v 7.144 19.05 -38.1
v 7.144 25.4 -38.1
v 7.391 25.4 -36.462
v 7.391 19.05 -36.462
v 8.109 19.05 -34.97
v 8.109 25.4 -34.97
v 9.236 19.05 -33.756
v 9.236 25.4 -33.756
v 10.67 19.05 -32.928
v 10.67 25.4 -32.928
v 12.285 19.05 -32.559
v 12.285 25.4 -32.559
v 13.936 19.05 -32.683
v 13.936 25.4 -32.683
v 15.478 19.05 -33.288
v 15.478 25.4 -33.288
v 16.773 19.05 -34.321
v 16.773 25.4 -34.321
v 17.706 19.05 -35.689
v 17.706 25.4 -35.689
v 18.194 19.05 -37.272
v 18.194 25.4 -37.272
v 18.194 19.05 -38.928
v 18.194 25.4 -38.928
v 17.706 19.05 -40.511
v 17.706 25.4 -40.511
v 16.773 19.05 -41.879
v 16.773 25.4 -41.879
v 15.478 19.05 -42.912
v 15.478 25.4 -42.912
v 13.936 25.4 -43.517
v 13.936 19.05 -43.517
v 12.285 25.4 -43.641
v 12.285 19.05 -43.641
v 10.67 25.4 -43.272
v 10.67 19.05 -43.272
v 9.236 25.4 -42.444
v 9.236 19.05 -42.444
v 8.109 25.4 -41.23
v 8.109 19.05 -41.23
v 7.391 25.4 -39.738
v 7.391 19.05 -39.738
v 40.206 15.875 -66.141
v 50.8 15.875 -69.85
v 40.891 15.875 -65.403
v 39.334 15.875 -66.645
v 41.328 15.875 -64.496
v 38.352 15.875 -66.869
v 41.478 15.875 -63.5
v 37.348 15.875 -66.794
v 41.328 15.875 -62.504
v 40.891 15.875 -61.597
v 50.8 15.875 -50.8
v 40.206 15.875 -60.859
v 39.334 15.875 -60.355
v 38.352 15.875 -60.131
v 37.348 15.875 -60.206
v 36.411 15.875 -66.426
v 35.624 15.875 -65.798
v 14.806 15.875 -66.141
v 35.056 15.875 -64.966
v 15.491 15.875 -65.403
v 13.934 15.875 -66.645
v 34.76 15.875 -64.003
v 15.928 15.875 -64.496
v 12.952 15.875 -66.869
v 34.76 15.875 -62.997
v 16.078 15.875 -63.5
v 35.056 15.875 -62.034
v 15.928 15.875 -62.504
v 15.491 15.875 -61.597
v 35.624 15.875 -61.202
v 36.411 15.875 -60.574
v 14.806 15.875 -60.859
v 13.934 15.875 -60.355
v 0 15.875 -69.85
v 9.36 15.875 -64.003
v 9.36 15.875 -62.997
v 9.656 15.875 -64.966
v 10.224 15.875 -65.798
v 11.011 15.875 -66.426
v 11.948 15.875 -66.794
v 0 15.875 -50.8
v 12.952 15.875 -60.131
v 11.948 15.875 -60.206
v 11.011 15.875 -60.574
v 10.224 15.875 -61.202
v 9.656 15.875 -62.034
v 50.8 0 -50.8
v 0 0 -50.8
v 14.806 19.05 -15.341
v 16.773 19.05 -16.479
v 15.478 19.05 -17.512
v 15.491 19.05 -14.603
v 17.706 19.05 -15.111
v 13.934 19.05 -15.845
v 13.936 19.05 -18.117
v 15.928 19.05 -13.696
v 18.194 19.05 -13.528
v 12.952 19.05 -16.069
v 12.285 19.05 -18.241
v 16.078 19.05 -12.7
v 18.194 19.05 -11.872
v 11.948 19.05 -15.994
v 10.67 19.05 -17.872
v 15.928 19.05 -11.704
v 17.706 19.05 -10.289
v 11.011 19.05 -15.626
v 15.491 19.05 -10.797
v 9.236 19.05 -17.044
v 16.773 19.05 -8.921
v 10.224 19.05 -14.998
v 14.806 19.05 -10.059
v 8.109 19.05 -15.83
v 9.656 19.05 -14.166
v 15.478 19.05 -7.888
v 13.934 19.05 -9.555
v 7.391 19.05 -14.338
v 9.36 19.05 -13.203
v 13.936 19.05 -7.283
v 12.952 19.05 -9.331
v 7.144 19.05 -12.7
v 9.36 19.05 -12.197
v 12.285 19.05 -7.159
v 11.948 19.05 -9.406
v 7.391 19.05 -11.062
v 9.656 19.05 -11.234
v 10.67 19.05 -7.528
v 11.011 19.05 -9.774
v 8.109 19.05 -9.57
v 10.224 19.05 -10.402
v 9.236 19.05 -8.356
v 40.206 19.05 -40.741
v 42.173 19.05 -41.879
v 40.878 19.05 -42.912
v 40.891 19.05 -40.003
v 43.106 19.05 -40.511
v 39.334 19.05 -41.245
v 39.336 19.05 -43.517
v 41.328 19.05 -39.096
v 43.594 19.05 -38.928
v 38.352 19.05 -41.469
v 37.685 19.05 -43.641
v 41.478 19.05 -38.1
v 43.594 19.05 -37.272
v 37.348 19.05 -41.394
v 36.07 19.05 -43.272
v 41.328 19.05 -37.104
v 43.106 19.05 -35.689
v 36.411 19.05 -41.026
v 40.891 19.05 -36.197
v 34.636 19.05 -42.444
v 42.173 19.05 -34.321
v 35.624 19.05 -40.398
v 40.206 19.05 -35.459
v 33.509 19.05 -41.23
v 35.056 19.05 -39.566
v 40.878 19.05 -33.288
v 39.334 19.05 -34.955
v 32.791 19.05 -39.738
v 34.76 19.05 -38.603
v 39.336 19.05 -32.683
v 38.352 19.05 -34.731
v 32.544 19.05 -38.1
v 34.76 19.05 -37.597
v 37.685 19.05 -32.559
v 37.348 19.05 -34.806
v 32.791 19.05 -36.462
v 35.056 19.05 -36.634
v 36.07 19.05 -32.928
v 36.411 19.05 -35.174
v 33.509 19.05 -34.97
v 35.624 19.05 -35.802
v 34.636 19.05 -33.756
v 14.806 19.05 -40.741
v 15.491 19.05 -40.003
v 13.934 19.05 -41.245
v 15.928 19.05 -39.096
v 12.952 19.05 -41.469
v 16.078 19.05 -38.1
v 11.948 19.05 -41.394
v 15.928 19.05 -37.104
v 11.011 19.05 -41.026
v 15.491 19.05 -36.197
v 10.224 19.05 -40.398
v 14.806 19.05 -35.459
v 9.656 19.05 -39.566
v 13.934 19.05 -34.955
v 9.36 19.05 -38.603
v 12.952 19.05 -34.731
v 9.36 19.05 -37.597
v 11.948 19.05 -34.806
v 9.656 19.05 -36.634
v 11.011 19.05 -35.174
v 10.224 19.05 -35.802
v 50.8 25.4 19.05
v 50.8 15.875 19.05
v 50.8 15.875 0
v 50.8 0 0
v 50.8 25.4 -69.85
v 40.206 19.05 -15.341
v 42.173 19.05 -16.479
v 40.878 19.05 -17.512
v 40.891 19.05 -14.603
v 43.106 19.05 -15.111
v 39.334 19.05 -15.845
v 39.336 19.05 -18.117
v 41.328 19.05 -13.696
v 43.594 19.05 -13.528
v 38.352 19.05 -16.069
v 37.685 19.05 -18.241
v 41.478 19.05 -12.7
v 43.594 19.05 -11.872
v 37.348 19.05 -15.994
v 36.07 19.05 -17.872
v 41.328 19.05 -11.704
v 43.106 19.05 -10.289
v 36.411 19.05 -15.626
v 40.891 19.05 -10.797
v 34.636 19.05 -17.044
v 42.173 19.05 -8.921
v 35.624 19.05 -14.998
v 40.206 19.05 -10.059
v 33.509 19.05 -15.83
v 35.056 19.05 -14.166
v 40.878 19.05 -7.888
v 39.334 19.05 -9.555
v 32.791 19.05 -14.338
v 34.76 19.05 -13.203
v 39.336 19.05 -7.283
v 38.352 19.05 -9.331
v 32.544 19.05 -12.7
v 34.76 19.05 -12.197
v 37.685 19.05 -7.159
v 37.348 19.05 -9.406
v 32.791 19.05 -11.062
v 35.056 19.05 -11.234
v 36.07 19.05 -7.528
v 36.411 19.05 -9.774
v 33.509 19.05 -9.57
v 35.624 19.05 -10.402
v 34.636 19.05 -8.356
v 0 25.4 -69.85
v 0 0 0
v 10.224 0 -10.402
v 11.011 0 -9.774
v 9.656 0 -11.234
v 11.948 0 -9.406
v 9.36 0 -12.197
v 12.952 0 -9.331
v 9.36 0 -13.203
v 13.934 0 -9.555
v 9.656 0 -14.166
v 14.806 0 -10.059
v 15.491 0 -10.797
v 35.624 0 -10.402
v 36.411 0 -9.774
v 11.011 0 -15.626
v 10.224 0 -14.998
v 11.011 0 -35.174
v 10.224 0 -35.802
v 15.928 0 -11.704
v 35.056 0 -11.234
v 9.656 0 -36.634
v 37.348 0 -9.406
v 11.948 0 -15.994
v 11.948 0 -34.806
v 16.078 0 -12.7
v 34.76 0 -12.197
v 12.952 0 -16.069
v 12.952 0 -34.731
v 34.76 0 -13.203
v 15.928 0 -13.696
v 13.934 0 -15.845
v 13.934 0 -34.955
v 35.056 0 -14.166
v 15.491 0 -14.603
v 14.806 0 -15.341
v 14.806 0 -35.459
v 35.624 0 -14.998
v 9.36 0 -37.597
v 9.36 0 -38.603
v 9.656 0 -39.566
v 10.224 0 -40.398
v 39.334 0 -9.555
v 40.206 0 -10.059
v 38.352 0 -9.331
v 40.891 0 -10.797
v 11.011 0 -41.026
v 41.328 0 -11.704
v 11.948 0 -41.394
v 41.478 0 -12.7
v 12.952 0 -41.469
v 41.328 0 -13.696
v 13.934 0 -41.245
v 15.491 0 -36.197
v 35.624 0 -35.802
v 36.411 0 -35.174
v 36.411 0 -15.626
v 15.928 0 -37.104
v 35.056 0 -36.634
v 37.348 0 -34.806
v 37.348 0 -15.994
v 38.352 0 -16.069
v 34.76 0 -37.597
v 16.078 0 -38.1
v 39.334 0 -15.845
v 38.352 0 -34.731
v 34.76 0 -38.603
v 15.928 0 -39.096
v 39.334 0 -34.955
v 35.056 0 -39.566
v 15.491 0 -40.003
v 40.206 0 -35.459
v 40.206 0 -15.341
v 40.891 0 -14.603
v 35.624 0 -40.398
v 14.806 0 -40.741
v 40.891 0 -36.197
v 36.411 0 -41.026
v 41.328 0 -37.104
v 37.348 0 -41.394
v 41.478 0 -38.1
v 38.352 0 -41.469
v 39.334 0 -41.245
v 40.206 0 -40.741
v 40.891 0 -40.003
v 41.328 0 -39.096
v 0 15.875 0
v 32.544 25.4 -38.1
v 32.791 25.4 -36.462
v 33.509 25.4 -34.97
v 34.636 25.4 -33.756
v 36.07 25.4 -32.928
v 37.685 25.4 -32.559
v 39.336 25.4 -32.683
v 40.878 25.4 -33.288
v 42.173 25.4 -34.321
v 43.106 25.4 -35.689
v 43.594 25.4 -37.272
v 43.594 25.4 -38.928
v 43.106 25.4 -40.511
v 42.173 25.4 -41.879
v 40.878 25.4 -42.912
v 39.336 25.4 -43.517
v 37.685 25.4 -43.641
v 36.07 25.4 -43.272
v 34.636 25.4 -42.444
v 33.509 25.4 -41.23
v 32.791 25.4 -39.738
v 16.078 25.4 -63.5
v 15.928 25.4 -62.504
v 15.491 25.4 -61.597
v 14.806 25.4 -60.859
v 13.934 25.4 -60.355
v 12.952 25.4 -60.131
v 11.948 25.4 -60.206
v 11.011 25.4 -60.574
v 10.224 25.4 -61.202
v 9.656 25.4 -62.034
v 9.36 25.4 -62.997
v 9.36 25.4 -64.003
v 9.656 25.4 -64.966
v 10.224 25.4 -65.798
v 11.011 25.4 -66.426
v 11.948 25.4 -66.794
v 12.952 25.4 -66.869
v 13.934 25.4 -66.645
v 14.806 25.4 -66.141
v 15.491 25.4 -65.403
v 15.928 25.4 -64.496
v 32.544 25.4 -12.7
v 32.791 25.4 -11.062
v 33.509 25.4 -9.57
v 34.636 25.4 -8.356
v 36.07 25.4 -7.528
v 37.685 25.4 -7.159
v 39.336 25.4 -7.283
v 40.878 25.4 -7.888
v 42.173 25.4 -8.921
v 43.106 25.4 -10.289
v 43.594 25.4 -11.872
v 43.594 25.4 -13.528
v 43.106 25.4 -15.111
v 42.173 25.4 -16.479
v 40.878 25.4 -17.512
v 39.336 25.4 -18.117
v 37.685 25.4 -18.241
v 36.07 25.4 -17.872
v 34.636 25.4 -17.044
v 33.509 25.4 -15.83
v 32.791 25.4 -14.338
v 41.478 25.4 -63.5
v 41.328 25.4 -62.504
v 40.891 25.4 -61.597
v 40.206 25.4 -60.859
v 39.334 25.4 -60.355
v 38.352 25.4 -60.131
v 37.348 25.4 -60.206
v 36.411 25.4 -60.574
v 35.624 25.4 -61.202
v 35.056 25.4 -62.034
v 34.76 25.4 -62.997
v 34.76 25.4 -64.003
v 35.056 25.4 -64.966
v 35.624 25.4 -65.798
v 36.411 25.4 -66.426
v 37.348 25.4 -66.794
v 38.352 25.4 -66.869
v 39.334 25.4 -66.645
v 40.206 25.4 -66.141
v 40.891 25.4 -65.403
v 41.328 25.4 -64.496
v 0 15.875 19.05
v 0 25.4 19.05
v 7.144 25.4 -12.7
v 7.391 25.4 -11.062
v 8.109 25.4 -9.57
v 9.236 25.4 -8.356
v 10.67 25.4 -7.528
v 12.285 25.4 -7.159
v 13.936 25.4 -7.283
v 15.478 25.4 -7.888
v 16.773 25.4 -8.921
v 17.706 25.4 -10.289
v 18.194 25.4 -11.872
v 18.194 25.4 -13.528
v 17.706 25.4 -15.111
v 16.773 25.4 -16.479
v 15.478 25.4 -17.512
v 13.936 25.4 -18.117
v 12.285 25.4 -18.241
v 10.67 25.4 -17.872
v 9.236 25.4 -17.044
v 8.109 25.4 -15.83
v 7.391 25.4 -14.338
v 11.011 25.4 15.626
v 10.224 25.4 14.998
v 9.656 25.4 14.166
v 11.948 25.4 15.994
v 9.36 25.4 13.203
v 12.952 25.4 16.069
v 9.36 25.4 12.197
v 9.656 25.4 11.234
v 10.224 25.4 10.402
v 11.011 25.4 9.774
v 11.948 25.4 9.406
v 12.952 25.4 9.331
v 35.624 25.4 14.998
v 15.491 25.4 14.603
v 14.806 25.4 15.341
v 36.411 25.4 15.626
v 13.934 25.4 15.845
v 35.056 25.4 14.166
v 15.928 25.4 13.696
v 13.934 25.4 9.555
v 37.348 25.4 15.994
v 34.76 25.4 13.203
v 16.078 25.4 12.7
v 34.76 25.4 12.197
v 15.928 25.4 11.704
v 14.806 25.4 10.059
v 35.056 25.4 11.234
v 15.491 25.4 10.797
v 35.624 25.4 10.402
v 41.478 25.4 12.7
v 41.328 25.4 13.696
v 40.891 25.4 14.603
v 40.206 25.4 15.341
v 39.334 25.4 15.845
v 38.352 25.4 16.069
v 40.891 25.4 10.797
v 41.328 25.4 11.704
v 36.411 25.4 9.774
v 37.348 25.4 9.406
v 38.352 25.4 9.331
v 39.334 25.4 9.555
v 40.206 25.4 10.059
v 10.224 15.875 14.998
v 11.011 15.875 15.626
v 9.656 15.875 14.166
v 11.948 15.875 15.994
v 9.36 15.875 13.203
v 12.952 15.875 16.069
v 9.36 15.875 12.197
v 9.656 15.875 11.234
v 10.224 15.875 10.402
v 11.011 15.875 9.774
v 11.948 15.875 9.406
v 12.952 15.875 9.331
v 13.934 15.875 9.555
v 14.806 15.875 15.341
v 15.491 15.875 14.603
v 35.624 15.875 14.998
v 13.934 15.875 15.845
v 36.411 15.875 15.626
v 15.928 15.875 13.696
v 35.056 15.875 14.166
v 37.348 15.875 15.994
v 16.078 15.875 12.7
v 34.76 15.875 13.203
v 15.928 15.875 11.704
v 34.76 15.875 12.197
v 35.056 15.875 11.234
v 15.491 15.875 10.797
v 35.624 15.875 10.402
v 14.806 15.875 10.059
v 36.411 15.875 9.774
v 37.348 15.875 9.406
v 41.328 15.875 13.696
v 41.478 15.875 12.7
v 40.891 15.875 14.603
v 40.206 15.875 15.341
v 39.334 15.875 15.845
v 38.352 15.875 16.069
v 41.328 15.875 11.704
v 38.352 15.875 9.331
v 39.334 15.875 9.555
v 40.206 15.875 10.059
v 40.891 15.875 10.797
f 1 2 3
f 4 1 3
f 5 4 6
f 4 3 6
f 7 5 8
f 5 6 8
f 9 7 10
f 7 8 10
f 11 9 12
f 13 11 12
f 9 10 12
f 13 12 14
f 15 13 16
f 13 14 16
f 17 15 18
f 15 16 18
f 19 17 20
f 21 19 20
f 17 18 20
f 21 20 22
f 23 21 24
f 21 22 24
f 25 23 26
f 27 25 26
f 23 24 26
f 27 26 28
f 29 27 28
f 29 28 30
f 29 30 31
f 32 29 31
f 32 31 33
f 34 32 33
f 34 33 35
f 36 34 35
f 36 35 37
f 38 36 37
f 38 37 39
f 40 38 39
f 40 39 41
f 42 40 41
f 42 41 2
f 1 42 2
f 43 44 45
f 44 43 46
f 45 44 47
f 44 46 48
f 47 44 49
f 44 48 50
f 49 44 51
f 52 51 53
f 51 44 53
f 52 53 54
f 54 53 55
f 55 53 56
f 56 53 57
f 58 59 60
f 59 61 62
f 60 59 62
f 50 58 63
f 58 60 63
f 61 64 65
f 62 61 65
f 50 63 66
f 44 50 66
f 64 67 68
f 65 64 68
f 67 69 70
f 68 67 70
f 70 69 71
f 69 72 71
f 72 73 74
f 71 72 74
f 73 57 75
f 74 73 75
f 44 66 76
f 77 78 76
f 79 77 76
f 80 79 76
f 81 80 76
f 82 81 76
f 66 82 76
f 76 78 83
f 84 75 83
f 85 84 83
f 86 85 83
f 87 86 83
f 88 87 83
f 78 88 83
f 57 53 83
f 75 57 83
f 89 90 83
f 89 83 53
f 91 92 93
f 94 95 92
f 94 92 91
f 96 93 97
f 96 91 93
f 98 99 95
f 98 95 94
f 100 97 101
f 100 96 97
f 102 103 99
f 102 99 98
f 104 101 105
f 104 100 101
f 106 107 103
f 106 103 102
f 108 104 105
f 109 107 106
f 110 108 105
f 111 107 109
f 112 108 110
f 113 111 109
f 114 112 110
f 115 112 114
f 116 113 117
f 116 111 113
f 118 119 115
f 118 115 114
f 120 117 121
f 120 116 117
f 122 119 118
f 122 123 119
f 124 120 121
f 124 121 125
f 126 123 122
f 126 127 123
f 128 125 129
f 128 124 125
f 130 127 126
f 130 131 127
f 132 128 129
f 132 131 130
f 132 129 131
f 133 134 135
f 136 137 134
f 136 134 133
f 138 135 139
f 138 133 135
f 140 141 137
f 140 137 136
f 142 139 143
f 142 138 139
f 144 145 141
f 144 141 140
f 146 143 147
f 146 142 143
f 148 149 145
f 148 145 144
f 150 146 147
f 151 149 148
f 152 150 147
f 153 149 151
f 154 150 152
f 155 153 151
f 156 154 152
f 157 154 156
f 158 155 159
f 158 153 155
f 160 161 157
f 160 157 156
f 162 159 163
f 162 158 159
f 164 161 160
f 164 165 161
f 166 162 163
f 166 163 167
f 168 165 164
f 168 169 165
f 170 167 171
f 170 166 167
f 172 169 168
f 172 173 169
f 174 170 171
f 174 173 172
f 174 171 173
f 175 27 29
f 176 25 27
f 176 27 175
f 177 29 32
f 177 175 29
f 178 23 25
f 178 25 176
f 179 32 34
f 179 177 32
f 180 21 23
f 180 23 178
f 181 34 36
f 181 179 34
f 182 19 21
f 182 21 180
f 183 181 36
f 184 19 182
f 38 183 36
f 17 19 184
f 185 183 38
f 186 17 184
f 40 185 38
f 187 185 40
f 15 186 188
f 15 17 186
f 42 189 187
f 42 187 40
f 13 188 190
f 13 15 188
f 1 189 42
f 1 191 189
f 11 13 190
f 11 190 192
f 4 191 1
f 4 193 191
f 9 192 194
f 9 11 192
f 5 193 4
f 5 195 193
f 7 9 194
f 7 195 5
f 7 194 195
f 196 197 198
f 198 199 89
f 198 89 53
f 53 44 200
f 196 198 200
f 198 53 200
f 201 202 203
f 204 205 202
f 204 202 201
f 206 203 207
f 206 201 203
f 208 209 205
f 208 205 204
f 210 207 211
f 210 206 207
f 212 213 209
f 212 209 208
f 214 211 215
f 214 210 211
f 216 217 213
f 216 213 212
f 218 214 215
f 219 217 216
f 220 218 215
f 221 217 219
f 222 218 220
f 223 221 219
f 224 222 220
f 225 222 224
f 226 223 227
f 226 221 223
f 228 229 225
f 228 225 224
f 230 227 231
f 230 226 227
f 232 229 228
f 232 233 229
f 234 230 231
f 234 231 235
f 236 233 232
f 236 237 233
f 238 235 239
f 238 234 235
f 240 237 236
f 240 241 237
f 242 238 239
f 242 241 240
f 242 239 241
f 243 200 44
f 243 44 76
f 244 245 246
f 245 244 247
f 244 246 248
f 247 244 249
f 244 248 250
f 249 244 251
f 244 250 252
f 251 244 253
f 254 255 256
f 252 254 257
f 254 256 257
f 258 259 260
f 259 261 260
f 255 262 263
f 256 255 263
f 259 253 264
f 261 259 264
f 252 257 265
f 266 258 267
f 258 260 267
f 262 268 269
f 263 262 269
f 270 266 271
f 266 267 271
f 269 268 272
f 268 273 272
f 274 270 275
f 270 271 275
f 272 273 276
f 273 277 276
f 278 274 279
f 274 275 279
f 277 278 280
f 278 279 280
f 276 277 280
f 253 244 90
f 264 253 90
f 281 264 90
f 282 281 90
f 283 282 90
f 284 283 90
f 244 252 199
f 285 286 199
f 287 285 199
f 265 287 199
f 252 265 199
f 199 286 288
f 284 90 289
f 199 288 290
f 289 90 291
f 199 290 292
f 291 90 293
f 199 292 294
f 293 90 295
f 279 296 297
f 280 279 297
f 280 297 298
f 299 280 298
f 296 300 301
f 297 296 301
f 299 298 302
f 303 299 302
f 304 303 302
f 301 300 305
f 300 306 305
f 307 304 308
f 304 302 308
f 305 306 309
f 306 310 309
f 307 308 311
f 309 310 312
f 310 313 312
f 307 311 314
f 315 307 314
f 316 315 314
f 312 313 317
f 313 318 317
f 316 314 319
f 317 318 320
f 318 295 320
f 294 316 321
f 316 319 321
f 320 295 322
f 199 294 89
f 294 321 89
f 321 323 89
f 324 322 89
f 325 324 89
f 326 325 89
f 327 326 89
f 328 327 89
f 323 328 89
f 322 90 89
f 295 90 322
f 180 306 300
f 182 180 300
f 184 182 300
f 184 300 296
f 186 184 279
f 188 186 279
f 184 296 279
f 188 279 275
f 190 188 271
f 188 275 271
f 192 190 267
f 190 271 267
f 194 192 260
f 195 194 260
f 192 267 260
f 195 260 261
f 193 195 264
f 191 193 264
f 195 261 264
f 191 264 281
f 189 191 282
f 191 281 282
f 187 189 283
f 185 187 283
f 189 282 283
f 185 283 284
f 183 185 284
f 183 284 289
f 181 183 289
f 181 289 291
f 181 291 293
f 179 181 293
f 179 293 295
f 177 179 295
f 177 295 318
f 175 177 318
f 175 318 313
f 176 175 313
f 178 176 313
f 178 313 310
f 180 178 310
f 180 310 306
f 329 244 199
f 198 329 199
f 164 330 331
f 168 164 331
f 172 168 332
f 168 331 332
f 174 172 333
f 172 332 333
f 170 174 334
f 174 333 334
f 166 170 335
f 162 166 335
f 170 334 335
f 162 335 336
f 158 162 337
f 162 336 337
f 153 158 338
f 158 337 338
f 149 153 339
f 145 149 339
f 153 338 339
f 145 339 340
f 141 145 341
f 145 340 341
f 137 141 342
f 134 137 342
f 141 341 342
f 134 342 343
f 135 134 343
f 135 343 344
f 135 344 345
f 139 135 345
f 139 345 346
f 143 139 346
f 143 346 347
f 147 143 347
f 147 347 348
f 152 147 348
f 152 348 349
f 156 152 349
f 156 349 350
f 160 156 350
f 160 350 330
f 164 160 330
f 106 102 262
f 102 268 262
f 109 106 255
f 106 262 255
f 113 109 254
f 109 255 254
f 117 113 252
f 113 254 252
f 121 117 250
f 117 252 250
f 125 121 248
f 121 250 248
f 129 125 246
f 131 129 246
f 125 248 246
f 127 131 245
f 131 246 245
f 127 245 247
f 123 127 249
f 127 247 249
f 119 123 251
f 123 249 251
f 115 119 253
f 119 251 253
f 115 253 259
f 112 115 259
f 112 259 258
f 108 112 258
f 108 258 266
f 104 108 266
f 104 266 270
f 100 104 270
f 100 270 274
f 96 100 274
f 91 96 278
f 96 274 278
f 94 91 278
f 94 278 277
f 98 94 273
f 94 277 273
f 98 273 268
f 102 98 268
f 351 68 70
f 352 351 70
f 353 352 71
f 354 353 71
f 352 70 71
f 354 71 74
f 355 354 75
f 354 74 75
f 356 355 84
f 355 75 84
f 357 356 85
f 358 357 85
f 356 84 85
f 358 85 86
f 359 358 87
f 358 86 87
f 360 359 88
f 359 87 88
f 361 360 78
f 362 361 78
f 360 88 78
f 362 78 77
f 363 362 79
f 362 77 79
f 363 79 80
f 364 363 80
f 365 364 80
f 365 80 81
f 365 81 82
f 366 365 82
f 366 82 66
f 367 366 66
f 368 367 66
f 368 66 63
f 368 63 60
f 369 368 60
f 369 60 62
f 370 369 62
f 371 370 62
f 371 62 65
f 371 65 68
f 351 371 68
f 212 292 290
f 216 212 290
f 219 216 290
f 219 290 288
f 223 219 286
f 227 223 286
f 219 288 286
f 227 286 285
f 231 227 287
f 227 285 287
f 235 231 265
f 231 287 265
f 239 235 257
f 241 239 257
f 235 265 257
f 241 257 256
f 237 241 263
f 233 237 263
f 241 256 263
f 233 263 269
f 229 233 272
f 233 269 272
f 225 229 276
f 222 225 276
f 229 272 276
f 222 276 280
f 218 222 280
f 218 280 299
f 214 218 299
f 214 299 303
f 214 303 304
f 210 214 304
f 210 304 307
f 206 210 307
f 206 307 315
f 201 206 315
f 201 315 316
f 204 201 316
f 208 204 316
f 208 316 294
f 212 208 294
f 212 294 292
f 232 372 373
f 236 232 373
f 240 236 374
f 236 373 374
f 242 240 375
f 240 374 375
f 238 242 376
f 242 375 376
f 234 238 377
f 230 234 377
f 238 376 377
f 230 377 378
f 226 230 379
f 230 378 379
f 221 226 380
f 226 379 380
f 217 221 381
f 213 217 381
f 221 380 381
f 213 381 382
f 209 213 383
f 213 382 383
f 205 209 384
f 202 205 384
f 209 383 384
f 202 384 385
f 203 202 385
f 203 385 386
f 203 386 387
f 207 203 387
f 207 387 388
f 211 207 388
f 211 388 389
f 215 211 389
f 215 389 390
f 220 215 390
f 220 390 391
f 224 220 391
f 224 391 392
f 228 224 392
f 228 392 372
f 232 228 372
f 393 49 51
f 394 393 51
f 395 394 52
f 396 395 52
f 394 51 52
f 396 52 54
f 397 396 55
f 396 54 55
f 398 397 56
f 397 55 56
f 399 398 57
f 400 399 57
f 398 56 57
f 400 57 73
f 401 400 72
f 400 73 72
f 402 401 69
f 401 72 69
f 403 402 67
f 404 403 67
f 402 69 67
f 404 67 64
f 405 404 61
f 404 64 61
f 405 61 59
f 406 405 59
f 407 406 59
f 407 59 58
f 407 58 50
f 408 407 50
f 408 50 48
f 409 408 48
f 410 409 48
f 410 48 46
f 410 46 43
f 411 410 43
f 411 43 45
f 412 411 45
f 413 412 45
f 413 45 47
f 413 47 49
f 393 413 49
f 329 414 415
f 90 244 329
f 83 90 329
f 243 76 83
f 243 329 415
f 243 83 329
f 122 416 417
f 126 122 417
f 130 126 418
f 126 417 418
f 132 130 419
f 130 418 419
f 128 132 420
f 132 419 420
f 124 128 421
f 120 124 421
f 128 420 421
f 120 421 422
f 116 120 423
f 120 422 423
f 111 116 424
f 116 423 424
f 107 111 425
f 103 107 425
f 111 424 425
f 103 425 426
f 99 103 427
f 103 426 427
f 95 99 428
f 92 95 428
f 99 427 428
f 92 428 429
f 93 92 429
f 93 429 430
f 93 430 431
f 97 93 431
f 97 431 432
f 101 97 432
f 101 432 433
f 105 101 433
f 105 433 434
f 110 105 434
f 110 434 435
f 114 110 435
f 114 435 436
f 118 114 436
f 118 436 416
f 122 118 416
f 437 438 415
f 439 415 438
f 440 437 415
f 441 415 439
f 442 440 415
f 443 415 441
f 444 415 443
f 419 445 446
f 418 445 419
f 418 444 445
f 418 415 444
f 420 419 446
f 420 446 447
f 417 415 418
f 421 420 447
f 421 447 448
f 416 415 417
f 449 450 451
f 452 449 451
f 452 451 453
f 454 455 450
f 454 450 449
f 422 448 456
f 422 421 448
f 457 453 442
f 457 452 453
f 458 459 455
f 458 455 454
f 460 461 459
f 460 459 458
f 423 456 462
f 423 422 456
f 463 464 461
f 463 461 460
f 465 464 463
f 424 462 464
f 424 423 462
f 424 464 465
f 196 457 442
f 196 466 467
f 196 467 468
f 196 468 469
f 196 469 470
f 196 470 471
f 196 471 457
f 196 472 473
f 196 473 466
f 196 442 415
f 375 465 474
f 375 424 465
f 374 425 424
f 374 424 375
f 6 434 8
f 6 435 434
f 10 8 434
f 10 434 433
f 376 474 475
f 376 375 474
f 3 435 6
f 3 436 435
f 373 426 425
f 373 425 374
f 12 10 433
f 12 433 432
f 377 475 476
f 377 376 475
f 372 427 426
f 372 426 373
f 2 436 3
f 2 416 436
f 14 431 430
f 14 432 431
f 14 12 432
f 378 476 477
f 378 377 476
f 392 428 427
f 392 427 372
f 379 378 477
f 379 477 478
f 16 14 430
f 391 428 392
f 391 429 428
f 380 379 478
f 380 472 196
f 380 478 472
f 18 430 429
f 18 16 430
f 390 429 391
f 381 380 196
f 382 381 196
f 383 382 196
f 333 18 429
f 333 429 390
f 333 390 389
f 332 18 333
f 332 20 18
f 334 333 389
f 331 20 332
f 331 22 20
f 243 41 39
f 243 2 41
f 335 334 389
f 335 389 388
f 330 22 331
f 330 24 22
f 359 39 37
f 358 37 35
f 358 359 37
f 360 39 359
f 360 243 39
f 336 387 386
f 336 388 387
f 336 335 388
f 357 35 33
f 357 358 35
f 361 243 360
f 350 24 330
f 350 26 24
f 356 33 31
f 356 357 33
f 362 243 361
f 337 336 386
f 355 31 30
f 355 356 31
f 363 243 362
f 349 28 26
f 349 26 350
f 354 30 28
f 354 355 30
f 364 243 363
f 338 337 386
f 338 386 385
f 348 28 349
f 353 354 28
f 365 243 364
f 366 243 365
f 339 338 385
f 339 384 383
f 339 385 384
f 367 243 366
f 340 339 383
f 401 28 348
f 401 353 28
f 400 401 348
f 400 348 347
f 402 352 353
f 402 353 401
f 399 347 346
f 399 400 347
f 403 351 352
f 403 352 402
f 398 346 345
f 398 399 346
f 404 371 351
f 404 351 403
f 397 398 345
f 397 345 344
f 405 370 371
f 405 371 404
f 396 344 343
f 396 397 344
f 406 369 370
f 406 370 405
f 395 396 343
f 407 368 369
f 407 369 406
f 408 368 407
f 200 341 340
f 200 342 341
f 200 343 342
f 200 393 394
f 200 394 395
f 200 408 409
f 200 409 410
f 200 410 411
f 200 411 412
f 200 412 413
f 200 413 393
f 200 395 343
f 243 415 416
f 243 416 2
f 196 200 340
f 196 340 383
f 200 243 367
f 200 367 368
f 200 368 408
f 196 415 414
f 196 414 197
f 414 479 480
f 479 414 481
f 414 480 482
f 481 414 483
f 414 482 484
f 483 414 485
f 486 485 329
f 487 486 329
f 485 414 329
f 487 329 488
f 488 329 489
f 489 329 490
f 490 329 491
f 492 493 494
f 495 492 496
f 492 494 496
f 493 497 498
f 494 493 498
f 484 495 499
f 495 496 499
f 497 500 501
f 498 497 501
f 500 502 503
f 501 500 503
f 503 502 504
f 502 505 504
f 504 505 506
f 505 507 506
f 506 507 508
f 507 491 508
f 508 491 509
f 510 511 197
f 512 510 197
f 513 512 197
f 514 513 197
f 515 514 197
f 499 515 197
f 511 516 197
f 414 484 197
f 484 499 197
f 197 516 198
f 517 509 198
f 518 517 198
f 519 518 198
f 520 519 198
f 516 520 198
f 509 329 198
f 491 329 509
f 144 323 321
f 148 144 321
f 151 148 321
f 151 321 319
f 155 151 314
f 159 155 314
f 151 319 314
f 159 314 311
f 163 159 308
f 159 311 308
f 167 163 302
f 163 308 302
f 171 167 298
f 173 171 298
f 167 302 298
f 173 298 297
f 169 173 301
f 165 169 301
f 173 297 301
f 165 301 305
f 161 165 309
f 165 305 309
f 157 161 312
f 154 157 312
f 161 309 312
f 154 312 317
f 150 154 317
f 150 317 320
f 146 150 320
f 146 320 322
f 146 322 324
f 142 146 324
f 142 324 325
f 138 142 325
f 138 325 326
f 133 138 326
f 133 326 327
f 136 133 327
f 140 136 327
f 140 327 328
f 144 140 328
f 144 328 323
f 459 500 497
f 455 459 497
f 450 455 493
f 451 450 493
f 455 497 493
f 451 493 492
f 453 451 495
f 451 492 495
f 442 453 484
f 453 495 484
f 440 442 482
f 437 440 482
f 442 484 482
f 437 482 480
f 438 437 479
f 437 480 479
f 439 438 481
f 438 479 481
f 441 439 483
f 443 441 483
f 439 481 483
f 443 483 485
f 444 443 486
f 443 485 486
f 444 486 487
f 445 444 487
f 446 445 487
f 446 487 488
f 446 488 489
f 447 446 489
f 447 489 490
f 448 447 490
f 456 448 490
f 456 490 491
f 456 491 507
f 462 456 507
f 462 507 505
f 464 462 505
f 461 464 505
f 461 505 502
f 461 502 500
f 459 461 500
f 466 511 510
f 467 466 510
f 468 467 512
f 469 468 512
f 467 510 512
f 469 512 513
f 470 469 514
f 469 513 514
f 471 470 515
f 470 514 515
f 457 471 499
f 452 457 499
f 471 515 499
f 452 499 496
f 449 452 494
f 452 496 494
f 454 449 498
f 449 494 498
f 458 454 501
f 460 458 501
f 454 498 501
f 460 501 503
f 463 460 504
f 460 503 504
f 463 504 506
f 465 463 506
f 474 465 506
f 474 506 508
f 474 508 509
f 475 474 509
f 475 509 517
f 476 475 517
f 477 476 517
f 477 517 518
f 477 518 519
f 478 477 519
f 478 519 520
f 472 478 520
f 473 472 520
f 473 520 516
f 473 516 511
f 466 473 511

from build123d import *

# Parameters (mm, degrees)
SKETCH1_W                                        = 50.8
SKETCH1_H                                        = 50.8
BOSS_EXTRUDE1_DEPTH                              = 25.4
SKETCH7_W                                        = 50.8
SKETCH7_H                                        = 9.525
BOSS_EXTRUDE2_DEPTH                              = 19.05
SKETCH11_W                                       = 50.8
SKETCH11_H                                       = 9.525
BOSS_EXTRUDE3_DEPTH                              = 19.05
F_1_4_CLEARANCE_HOLE1_D                          = 6.7564
CBORE_FOR_1_4_SOCKET_HEAD_CAP_SCREW1_D           = 6.7564
CBORE_FOR_1_4_SOCKET_HEAD_CAP_SCREW1_CBORE_D     = 11.1125
CBORE_FOR_1_4_SOCKET_HEAD_CAP_SCREW1_CBORE_DEPTH = 6.35
LPATTERN1_COUNT                                  = 4
LPATTERN1_PITCH                                  = 25.4
LPATTERN1_COUNT_DIR2                             = 2
LPATTERN1_PITCH_DIR2                             = 25.4
LPATTERN2_COUNT                                  = 2
LPATTERN2_PITCH                                  = 25.4
LPATTERN2_COUNT_DIR2                             = 2
LPATTERN2_PITCH_DIR2                             = 25.4


with BuildPart() as part:
    # Sketch1 → Boss-Extrude1 (new body)
    with BuildSketch(Plane(origin=(0, 0, 0), x_dir=(1, 0, 0), z_dir=(0, 1, 0))):
        with Locations((25.4, 25.4)):
            Rectangle(SKETCH1_W, SKETCH1_H)
    extrude(amount=BOSS_EXTRUDE1_DEPTH)

    # Sketch7 → Boss-Extrude2 (add)
    with BuildSketch(Plane(origin=(0, 0, -50.8), x_dir=(-1, 0, 0), z_dir=(0, 0, -1))):
        with Locations((-25.4, 20.6375)):
            Rectangle(SKETCH7_W, SKETCH7_H)
    extrude(amount=BOSS_EXTRUDE2_DEPTH)

    # Sketch11 → Boss-Extrude3 (add)
    with BuildSketch(Plane.XY):
        with Locations((25.4, 20.6375)):
            Rectangle(SKETCH11_W, SKETCH11_H)
    extrude(amount=BOSS_EXTRUDE3_DEPTH)

    # 1/4 Clearance Hole1 (through all)
    with Locations(Plane(origin=(0, 25.4, 0), x_dir=(-1, 0, 0), z_dir=(0, 1, 0))):
        with Locations((-12.7, -63.5)):
            f_1_4_clearance_hole1 = Hole(F_1_4_CLEARANCE_HOLE1_D / 2)

    # CBORE for 1/4 Socket Head Cap Screw1 (through all)
    with Locations(Plane(origin=(0, 25.4, 0), x_dir=(-1, 0, 0), z_dir=(0, 1, 0))):
        with Locations((-12.7, -12.7)):
            cbore_for_1_4_socket_head_cap_screw1 = CounterBoreHole(CBORE_FOR_1_4_SOCKET_HEAD_CAP_SCREW1_D / 2, CBORE_FOR_1_4_SOCKET_HEAD_CAP_SCREW1_CBORE_D / 2, CBORE_FOR_1_4_SOCKET_HEAD_CAP_SCREW1_CBORE_DEPTH)

    # LPattern1: 1_4 Clearance Hole1 4 × 2
    with Locations(*[(j * LPATTERN1_PITCH_DIR2, 0, i * LPATTERN1_PITCH) for i in range(LPATTERN1_COUNT) for j in range(LPATTERN1_COUNT_DIR2) if (i, j) != (0, 0)]):
        add(f_1_4_clearance_hole1, mode=Mode.SUBTRACT)

    # LPattern2: CBORE for 1_4 Socket Head Cap Screw1 2 × 2
    with Locations(*[(j * LPATTERN2_PITCH_DIR2, 0, -i * LPATTERN2_PITCH) for i in range(LPATTERN2_COUNT) for j in range(LPATTERN2_COUNT_DIR2) if (i, j) != (0, 0)]):
        add(cbore_for_1_4_socket_head_cap_screw1, mode=Mode.SUBTRACT)


solid = part.part
